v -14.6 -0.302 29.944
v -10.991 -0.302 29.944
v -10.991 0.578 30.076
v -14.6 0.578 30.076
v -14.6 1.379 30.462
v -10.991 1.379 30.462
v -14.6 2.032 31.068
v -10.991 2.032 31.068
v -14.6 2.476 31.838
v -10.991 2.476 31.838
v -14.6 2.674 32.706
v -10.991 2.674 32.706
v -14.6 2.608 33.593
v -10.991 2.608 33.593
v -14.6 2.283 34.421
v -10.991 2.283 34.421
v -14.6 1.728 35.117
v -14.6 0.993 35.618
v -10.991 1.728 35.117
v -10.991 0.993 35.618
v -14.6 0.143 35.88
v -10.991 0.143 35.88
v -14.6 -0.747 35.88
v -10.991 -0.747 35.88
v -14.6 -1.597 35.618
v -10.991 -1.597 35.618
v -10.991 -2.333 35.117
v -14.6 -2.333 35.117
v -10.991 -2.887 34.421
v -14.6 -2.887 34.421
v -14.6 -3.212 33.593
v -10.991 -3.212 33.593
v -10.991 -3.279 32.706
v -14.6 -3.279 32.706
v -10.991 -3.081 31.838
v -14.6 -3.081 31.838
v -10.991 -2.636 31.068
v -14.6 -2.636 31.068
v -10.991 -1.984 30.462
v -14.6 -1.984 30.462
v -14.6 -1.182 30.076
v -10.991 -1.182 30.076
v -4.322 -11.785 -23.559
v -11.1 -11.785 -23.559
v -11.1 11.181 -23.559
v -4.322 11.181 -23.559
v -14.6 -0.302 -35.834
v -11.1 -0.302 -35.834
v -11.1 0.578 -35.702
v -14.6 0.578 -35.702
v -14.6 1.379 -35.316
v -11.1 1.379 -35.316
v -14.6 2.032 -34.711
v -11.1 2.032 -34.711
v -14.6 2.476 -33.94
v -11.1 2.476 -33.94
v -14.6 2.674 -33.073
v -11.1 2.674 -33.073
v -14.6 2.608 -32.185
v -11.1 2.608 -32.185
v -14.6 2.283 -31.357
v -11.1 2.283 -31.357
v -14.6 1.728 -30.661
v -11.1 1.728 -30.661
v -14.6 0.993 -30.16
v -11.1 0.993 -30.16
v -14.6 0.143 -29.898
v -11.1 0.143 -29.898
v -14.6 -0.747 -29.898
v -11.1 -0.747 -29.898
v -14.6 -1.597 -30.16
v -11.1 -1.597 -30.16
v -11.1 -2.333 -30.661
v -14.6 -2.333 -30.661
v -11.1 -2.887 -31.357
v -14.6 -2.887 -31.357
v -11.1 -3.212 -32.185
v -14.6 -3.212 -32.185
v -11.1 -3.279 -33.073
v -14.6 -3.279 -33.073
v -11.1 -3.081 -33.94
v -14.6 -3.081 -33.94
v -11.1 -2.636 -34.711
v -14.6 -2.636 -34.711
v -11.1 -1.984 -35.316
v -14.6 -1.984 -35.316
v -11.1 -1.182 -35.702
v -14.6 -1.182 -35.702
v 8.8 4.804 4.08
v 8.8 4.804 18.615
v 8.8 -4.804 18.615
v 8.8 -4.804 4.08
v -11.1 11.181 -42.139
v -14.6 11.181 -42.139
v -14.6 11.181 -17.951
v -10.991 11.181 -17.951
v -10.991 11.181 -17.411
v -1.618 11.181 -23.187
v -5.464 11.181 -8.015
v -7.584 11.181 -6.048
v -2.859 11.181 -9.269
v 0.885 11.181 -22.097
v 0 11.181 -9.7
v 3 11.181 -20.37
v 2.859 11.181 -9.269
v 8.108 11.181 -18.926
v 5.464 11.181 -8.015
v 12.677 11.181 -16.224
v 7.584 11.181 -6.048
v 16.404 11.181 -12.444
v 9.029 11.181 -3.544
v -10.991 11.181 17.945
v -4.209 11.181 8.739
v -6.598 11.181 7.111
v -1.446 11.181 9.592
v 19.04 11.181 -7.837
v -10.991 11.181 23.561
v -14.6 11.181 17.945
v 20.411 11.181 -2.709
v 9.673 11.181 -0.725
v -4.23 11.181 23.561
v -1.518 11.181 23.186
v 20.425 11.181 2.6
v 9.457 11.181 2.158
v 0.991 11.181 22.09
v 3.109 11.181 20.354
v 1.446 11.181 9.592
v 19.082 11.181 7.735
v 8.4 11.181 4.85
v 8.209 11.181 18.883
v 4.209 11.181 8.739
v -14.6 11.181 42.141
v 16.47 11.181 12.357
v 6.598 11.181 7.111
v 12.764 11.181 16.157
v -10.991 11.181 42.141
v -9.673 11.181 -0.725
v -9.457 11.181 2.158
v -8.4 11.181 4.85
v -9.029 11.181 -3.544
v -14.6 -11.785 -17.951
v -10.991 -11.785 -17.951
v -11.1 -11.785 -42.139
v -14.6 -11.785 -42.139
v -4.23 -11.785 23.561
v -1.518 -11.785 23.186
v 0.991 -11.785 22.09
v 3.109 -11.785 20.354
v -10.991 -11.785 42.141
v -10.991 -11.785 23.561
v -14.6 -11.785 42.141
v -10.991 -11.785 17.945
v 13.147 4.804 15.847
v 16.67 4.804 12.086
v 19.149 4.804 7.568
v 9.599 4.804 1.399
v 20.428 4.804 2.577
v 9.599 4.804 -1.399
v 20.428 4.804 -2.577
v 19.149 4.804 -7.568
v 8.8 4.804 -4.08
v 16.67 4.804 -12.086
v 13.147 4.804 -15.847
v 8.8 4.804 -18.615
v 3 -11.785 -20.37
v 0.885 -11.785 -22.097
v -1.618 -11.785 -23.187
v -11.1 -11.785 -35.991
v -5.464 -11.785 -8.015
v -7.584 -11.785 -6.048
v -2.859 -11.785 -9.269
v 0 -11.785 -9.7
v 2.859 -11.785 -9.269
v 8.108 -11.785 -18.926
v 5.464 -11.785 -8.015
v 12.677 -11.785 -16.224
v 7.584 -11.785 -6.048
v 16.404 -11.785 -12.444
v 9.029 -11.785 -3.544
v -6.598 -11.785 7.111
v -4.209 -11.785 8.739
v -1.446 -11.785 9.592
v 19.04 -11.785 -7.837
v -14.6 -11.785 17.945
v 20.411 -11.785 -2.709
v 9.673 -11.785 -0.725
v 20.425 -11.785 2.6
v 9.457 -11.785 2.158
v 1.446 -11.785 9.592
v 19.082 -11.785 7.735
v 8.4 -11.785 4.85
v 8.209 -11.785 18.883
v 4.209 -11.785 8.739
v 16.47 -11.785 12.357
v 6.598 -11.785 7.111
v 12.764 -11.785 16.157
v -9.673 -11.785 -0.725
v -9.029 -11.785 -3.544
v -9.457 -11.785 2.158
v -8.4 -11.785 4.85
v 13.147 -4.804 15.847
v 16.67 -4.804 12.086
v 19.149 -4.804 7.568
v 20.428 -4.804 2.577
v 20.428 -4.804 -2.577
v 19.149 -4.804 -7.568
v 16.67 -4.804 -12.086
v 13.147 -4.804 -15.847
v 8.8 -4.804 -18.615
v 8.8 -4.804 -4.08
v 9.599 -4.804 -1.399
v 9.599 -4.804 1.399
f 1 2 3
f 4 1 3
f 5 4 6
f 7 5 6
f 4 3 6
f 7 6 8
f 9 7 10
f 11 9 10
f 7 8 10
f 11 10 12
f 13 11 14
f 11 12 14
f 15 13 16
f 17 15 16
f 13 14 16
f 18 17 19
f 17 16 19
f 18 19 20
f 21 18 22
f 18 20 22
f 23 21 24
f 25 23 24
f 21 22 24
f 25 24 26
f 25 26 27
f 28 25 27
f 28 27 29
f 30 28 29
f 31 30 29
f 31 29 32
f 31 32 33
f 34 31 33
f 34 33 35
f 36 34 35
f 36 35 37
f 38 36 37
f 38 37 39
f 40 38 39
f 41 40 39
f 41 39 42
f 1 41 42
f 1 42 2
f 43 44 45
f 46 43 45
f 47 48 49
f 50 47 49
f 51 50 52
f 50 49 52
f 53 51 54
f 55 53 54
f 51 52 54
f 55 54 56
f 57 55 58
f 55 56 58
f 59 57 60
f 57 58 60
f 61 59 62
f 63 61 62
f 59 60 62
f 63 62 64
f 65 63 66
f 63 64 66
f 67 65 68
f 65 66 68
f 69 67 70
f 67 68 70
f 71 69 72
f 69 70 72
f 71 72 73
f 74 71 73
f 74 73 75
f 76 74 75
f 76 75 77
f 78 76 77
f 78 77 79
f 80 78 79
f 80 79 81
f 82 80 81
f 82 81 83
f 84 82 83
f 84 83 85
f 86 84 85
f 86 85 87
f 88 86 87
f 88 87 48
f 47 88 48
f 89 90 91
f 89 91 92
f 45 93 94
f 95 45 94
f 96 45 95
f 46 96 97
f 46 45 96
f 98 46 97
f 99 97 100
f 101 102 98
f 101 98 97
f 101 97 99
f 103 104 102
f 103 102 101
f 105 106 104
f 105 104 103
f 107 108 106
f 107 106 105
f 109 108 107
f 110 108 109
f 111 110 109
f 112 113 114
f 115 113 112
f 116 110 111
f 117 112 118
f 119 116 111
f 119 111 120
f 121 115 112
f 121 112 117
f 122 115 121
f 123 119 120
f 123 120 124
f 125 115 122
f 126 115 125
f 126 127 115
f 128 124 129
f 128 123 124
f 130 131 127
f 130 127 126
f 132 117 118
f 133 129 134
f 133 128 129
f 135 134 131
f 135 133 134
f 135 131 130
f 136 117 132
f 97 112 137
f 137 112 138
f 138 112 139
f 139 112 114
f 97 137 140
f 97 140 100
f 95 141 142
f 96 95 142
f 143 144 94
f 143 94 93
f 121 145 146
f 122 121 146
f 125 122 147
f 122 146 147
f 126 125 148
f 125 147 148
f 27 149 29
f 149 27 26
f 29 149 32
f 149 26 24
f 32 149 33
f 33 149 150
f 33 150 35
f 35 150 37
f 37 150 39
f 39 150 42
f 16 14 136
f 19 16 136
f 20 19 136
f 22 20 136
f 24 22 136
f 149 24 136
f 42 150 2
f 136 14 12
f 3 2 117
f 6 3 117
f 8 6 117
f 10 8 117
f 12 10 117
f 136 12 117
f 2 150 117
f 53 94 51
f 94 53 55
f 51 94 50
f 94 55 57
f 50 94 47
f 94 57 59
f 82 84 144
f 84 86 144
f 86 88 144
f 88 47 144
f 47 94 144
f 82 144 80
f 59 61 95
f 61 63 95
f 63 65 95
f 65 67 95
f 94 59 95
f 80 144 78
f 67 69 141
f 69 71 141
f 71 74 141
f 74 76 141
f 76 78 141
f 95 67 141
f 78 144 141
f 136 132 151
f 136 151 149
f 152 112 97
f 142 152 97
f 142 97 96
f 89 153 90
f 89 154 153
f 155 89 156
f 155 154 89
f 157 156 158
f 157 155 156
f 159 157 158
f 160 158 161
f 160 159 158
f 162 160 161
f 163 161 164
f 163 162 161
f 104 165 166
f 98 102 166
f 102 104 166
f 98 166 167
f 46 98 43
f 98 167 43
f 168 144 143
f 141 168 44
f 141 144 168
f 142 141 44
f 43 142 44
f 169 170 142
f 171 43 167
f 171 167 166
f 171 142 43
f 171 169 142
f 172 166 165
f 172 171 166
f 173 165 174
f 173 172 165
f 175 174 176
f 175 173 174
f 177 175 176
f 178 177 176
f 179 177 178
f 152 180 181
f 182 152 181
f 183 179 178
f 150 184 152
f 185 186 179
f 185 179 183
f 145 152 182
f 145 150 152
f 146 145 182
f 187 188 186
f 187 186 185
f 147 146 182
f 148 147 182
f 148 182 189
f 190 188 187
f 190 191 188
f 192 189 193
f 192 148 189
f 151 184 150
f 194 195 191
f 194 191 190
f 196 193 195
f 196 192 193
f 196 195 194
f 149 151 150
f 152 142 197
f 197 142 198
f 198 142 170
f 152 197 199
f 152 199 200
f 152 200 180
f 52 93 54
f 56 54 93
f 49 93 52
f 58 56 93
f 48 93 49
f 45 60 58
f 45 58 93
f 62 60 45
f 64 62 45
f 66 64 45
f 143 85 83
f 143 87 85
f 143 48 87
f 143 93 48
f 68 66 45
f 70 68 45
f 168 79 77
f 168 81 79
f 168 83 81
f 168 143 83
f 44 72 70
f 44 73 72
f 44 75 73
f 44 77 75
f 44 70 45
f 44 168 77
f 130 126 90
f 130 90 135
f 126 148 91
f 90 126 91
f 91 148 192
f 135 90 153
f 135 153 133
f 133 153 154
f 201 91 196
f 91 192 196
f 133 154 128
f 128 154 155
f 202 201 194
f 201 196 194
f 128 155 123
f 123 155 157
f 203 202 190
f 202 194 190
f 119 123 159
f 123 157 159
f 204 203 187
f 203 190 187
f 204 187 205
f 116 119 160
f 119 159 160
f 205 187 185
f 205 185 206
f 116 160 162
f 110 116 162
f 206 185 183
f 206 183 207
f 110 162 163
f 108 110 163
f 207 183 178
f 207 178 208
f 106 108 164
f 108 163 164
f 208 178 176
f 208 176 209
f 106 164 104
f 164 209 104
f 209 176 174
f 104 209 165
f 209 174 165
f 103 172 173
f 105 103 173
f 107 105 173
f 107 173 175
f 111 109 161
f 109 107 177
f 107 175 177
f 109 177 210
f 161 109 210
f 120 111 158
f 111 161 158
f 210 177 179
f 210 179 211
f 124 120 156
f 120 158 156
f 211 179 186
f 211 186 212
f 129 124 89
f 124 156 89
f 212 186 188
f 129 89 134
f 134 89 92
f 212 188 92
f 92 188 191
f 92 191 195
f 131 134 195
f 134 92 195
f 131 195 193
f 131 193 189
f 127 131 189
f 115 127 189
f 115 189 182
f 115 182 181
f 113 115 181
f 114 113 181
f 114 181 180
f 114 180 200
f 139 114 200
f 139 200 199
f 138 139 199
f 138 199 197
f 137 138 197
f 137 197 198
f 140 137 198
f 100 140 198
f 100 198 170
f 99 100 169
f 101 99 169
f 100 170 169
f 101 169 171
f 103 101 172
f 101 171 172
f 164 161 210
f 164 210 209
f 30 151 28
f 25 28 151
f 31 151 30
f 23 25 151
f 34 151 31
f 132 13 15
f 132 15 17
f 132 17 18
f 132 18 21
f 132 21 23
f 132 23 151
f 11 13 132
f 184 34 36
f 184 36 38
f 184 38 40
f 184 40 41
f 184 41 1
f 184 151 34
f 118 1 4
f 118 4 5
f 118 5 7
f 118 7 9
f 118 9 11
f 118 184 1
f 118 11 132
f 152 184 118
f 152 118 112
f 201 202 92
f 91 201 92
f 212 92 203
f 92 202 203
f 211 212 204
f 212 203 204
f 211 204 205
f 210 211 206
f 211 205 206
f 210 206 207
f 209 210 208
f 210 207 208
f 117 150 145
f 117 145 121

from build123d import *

# Parameters (mm, degrees)
SKETCH_1_R           = 20.68
SKETCH_1_R_2         = 9.68
EXTRUDE_1_DEPTH      = 116.68
SKETCH_11_W          = 27
SKETCH_11_H          = 150
CUT_EXTRUDE_3_DEPTH  = 40
SKETCH_13_W          = 10
SKETCH_13_H          = 128.345013401
CUT_EXTRUDE_7_DEPTH  = 126.614916312
SKETCH_15_W          = 8
SKETCH_15_H          = 68.68
CUT_EXTRUDE_9_DEPTH  = 48
SKETCH_16_W          = 15.549431524
SKETCH_16_H          = 20
SKETCH_16_W_2        = 15.459431524
EXTRUDE_4_DEPTH      = 19.2
SKETCH_17_W          = 19.20851187
SKETCH_17_H          = 14.03
CUT_EXTRUDE_10_DEPTH = 20.2
SKETCH_18_R          = 9.59
CUT_EXTRUDE_11_DEPTH = 121.289430957
SKETCH_21_R          = 2.985
CUT_EXTRUDE_12_DEPTH = 55.2
EXTRUDE_START        = 55.2
SKETCH_24_R          = 20.59
SKETCH_24_R_2        = 9.59
EXTRUDE_2_DEPTH      = 55.2
CUT_EXTRUDE_13_DEPTH = 55.2
SKETCH_26_W          = 10.00851187
SKETCH_26_H          = 41.68
CUT_EXTRUDE_15_DEPTH = 55.2
SKETCH_27_W          = 10
SKETCH_27_H          = 40
CUT_EXTRUDE_16_DEPTH = 55.2
SKETCH_28_W          = 44.880694938
SKETCH_28_H          = 9.608044066
CUT_EXTRUDE_17_DEPTH = 12.2
SKETCH_35_W          = 13.53
SKETCH_35_H          = 20
EXTRUDE_10_DEPTH     = 15
EXTRUDE_11_DEPTH     = 15
SKETCH_37_W          = 9
SKETCH_37_H          = 20
EXTRUDE_12_DEPTH     = 20
SKETCH_38_W          = 9
SKETCH_38_H          = 20
EXTRUDE_13_DEPTH     = 20
SKETCH_42_R          = 2.985
CUT_EXTRUDE_21_DEPTH = 20
CUT_EXTRUDE_23_DEPTH = 138.235841092
SKETCH_45_W          = 3
SKETCH_45_H          = 20
EXTRUDE_14_DEPTH     = 30
SKETCH_46_W          = 3
SKETCH_46_H          = 20
EXTRUDE_15_DEPTH     = 30
SKETCH_47_W          = 33.078221107
SKETCH_47_H          = 20
EXTRUDE_16_DEPTH     = 50
SKETCH_48_W          = 30
SKETCH_48_H          = 20
EXTRUDE_17_DEPTH     = 50
SKETCH_50_W          = 50
SKETCH_50_H          = 20
EXTRUDE_18_DEPTH     = 1
SKETCH_51_W          = 50
SKETCH_51_H          = 20
EXTRUDE_19_DEPTH     = 1
SKETCH_52_W          = 53
SKETCH_52_H          = 14
CUT_EXTRUDE_24_DEPTH = 151.972575738
SKETCH_53_W          = 53
SKETCH_53_H          = 14
CUT_EXTRUDE_25_DEPTH = 151.942387436
SKETCH_54_W          = 40
SKETCH_54_H          = 73.27
CUT_EXTRUDE_26_DEPTH = 147.866192927
SKETCH_56_W          = 13.00851187
SKETCH_56_H          = 20
EXTRUDE_21_DEPTH     = 3.08
SKETCH_60_W          = 6.504255935
SKETCH_60_H          = 76.35
CUT_EXTRUDE_30_DEPTH = 137.106994034
CUT_EXTRUDE_32_DEPTH = 20
SKETCH_64_W          = 16.20851187
SKETCH_64_H          = 0.09
EXTRUDE_22_DEPTH     = 20
SKETCH_65_W          = 3.495744065
SKETCH_65_H          = 3.26
CUT_EXTRUDE_33_DEPTH = 137.057988464
SKETCH_66_W          = 3.495744065
SKETCH_66_H          = 1.776778893
SKETCH_66_W_2        = 3.503635083
SKETCH_66_H_2        = 1.775
EXTRUDE_23_DEPTH     = 20.2
SKETCH_68_W          = 6.504255935
SKETCH_68_H          = 3.66
CUT_EXTRUDE_34_DEPTH = 20
SKETCH_69_R          = 2.985
CUT_EXTRUDE_35_DEPTH = 126.598983893
SKETCH_70_R          = 2.985
CUT_EXTRUDE_36_DEPTH = 132.360728238
SKETCH_71_W          = 38.005321573
SKETCH_71_H          = 111.965885132
CUT_EXTRUDE_37_DEPTH = 147.475577566
SKETCH_72_R          = 9.7
CUT_EXTRUDE_38_DEPTH = 38.185254838
CUT_EXTRUDE_START    = -22
SKETCH_77_R          = 30.59
SKETCH_77_R_2        = 20.59
CUT_EXTRUDE_2_DEPTH  = 22
SKETCH_78_W          = 34.816185151
SKETCH_78_H          = 22.96559116
EXTRUDE_26_DEPTH     = 0.1
SKETCH_80_W          = 2.900031179
SKETCH_80_H          = 6.148706656
EXTRUDE_28_DEPTH     = 23.1
SKETCH_81_W          = 6.148706656
SKETCH_81_H          = 23.1
EXTRUDE_29_DEPTH     = 14.1
SKETCH_82_W          = 6.148706656
SKETCH_82_H          = 0.13440884
CUT_EXTRUDE_39_DEPTH = 19.1
SKETCH_83_W          = 2.900031179
SKETCH_83_H          = 22.96559116
EXTRUDE_30_DEPTH     = 19.1
FILLET_1_R           = 10
SKETCH_84_W          = 3.5
SKETCH_84_H          = 19.1
EXTRUDE_31_DEPTH     = 23.1
SKETCH_85_W          = 3.5
SKETCH_85_H          = 0.52
CUT_EXTRUDE_40_DEPTH = 48.860163141
SKETCH_86_W          = 3.5
SKETCH_86_H          = 22.96559116
EXTRUDE_32_DEPTH     = 62.1
SKETCH_87_W          = 3.60851187
SKETCH_87_H          = 34.816185151
CUT_EXTRUDE_41_DEPTH = 62.1
SKETCH_89_W          = 0.10851187
SKETCH_89_H          = 6.15
EXTRUDE_33_DEPTH     = 23.1
EXTRUDE_34_DEPTH     = 22.1
SKETCH_91_W          = 0.971561636
SKETCH_91_H          = 22.96559116
CUT_EXTRUDE_42_DEPTH = 22.1
SKETCH_95_W          = 6.15
SKETCH_95_H          = 22.96559116
EXTRUDE_35_DEPTH     = 14.1
FILLET_2_R           = 10
SKETCH_96_W          = 3.60851187
SKETCH_96_H          = 2.548438364
CUT_EXTRUDE_43_DEPTH = 55.35700885
SKETCH_97_W          = 3.5
SKETCH_97_H          = 6.148706656
EXTRUDE_36_DEPTH     = 23.1
CUT_EXTRUDE_44_DEPTH = 23.1
SKETCH_99_W          = 6.15
SKETCH_99_H          = 0.13440884
CUT_EXTRUDE_45_DEPTH = 23.1
SKETCH_101_R         = 2.985
CUT_EXTRUDE_46_DEPTH = 23.1
SKETCH_103_W         = 3.60851187
SKETCH_103_H         = 0.54
CUT_EXTRUDE_49_DEPTH = 53.222714265
SKETCH_104_W         = 3.60851187
SKETCH_104_H         = 0.54
CUT_EXTRUDE_50_DEPTH = 53.222714265


with BuildPart() as part:
    # 草圖1 → 伸長-薄件1 (new body)
    with BuildSketch(Plane(origin=(0, 0, 0), x_dir=(1, 0, 0), z_dir=(0, 1, 0))):
        Circle(SKETCH_1_R)
        Circle(SKETCH_1_R_2, mode=Mode.SUBTRACT)
    extrude(amount=EXTRUDE_1_DEPTH)

    # 草圖11 → 除料-伸長3 (cut)
    with BuildSketch(Plane(origin=(0, 116.68, 0), x_dir=(1, 0, 0), z_dir=(0, 1, 0))):
        with Locations((21.70851187, -44.235815192)):
            Rectangle(SKETCH_11_W, SKETCH_11_H)
    extrude(amount=-CUT_EXTRUDE_3_DEPTH, mode=Mode.SUBTRACT)

    # 草圖13 → 除料-伸長7 (cut, through all)
    with BuildSketch(Plane.XY.offset(21)):
        with Locations((-16, 58.612182466)):
            Rectangle(SKETCH_13_W, SKETCH_13_H)
    extrude(amount=-CUT_EXTRUDE_7_DEPTH, mode=Mode.SUBTRACT)

    # 草圖15 → 除料-伸長9 (cut)
    with BuildSketch(Plane.XY.offset(21)):
        with Locations((-1.395744065, 52.34)):
            Rectangle(SKETCH_15_W, SKETCH_15_H)
    extrude(amount=-CUT_EXTRUDE_9_DEPTH, mode=Mode.SUBTRACT)

    # 草圖16 → 填料-伸長4 (add)
    with BuildSketch(Plane(origin=(8.20851187, 0, 0), x_dir=(0, 0, -1), z_dir=(1, 0, 0))):
        with Locations((12.905284238, 106.68)):
            Rectangle(SKETCH_16_W, SKETCH_16_H)
        with Locations((-12.860284238, 106.68)):
            Rectangle(SKETCH_16_W_2, SKETCH_16_H)
    extrude(amount=-EXTRUDE_4_DEPTH)

    # 草圖17 → 除料-伸長10 (cut)
    with BuildSketch(Plane(origin=(0, 116.68, 0), x_dir=(1, 0, 0), z_dir=(0, 1, 0))):
        with Locations((-1.395744065, -0.045)):
            Rectangle(SKETCH_17_W, SKETCH_17_H)
    extrude(amount=-CUT_EXTRUDE_10_DEPTH, mode=Mode.SUBTRACT)

    # 草圖18 → 除料-伸長11 (cut, through all)
    with BuildSketch(Plane.XZ):
        with Locations(Location((0, 0, 0), (0, 0, 90))):
            Circle(SKETCH_18_R)
    extrude(amount=-CUT_EXTRUDE_11_DEPTH, mode=Mode.SUBTRACT)

    # 草圖21 → 除料-伸長12 (cut)
    with BuildSketch(Plane(origin=(0, 0, -20.68), x_dir=(-1, 0, 0), z_dir=(0, 0, -1))):
        with Locations((1.39148813, 108.73)):
            Circle(SKETCH_21_R)
    extrude(amount=-CUT_EXTRUDE_12_DEPTH, mode=Mode.SUBTRACT)

    # 草圖24 → 伸長-薄件2 (add)
    with BuildSketch(Plane.XZ.offset(EXTRUDE_START)):
        Circle(SKETCH_24_R)
        Circle(SKETCH_24_R_2, mode=Mode.SUBTRACT)
    extrude(amount=-EXTRUDE_2_DEPTH)

    # 草圖25 → 除料-伸長13 (cut)
    with BuildSketch(Plane.XY.offset(21)):
        Polygon((-1.39148813, -11.785), (22.612379708, -11.785), (22.612379708, -63.873337429), (-22.749525245, -63.873337429), (-22.749525245, -11.785), align=None)
    extrude(amount=-CUT_EXTRUDE_13_DEPTH, mode=Mode.SUBTRACT)

    # 草圖26 → 除料-伸長15 (cut)
    with BuildSketch(Plane(origin=(0, 0, 0), x_dir=(1, 0, 0), z_dir=(0, 1, 0))):
        with Locations((-15.995744065, -0.16)):
            Rectangle(SKETCH_26_W, SKETCH_26_H)
    extrude(amount=-CUT_EXTRUDE_15_DEPTH, mode=Mode.SUBTRACT)

    # 草圖27 → 除料-伸長16 (cut)
    with BuildSketch(Plane(origin=(21, 0, 0), x_dir=(0, 0, -1), z_dir=(1, 0, 0))):
        with Locations((0, 41.68)):
            Rectangle(SKETCH_27_W, SKETCH_27_H)
    extrude(amount=-CUT_EXTRUDE_16_DEPTH, mode=Mode.SUBTRACT)

    # 草圖28 → 除料-伸長17 (cut)
    with BuildSketch(Plane(origin=(21, 0, 0), x_dir=(0, 0, -1), z_dir=(1, 0, 0))):
        Rectangle(SKETCH_28_W, SKETCH_28_H)
    extrude(amount=-CUT_EXTRUDE_17_DEPTH, mode=Mode.SUBTRACT)

    # 草圖35 → 填料-伸長10 (add)
    with BuildSketch(Plane.ZY.offset(10.99148813)):
        with Locations((13.825, 106.68)):
            Rectangle(SKETCH_35_W, SKETCH_35_H)
    extrude(amount=EXTRUDE_10_DEPTH)

    # 草圖36 → 填料-伸長11 (add)
    with BuildSketch(Plane.ZY.offset(10.99148813)):
        Polygon((-20.68, 116.68), (-6.97, 116.68), (-6.97, 96.48), (-20.68, 96.68), align=None)
    extrude(amount=EXTRUDE_11_DEPTH)

    # 草圖37 → 填料-伸長12 (add)
    with BuildSketch(Plane.XY.offset(20.59)):
        with Locations((-21.49148813, 106.68)):
            Rectangle(SKETCH_37_W, SKETCH_37_H)
    extrude(amount=EXTRUDE_12_DEPTH)

    # 草圖38 → 填料-伸長13 (add)
    with BuildSketch(Plane(origin=(0, 0, -20.68), x_dir=(-1, 0, 0), z_dir=(0, 0, -1))):
        with Locations((21.49148813, 106.68)):
            Rectangle(SKETCH_38_W, SKETCH_38_H)
    extrude(amount=EXTRUDE_13_DEPTH)

    # 草圖42 → 除料-伸長21 (cut)
    with BuildSketch(Plane(origin=(-16.99148813, 0, 0), x_dir=(0, 0, -1), z_dir=(1, 0, 0))):
        with Locations((30.68, 106.554418142)):
            Circle(SKETCH_42_R)
        with Locations((-30.395640125, 106.68)):
            Circle(SKETCH_42_R)
    extrude(amount=-CUT_EXTRUDE_21_DEPTH, mode=Mode.SUBTRACT)

    # 草圖43 → 除料-伸長23 (cut, through all)
    with BuildSketch(Plane(origin=(0, 116.68, 0), x_dir=(1, 0, 0), z_dir=(0, 1, 0))):
        Polygon((-11, 6.97), (-10.99148813, 20.68), (-10.99148813, 48.096794253), (-28.274756234, 48.096794253), (-28.274756234, -43.270506289), (-11, -43.270506289), align=None)
    extrude(amount=-CUT_EXTRUDE_23_DEPTH, mode=Mode.SUBTRACT)

    # 草圖45 → 填料-伸長14 (add)
    with BuildSketch(Plane.XY.offset(20.59)):
        with Locations((-9.5, 106.68)):
            Rectangle(SKETCH_45_W, SKETCH_45_H)
    extrude(amount=EXTRUDE_14_DEPTH)

    # 草圖46 → 填料-伸長15 (add)
    with BuildSketch(Plane(origin=(0, 0, -20.68), x_dir=(-1, 0, 0), z_dir=(0, 0, -1))):
        with Locations((9.49148813, 106.68)):
            Rectangle(SKETCH_46_W, SKETCH_46_H)
    extrude(amount=EXTRUDE_15_DEPTH)

    # 草圖47 → 填料-伸長16 (add)
    with BuildSketch(Plane.ZY.offset(11)):
        with Locations((34.050889447, 106.68)):
            Rectangle(SKETCH_47_W, SKETCH_47_H)
    extrude(amount=EXTRUDE_16_DEPTH)

    # 草圖48 → 填料-伸長17 (add)
    with BuildSketch(Plane.ZY.offset(10.99148813)):
        with Locations((-35.68, 106.68)):
            Rectangle(SKETCH_48_W, SKETCH_48_H)
    extrude(amount=EXTRUDE_17_DEPTH)

    # 草圖50 → 填料-伸長18 (add)
    with BuildSketch(Plane(origin=(0, 0, 17.511778893), x_dir=(-1, 0, 0), z_dir=(0, 0, -1))):
        with Locations((36, 106.68)):
            Rectangle(SKETCH_50_W, SKETCH_50_H)
    extrude(amount=EXTRUDE_18_DEPTH)

    # 草圖51 → 填料-伸長19 (add)
    with BuildSketch(Plane.XY.offset(-20.68)):
        with Locations((-35.99148813, 106.68)):
            Rectangle(SKETCH_51_W, SKETCH_51_H)
    extrude(amount=EXTRUDE_19_DEPTH)

    # 草圖52 → 除料-伸長24 (cut, through all)
    with BuildSketch(Plane(origin=(0, 116.68, 0), x_dir=(1, 0, 0), z_dir=(0, 1, 0))):
        with Locations((-34.49148813, 43.68)):
            Rectangle(SKETCH_52_W, SKETCH_52_H)
    extrude(amount=-CUT_EXTRUDE_24_DEPTH, mode=Mode.SUBTRACT)

    # 草圖53 → 除料-伸長25 (cut, through all)
    with BuildSketch(Plane(origin=(0, 116.68, 0), x_dir=(1, 0, 0), z_dir=(0, 1, 0))):
        with Locations((-34.5, -43.59)):
            Rectangle(SKETCH_53_W, SKETCH_53_H)
    extrude(amount=-CUT_EXTRUDE_25_DEPTH, mode=Mode.SUBTRACT)

    # 草圖54 → 除料-伸長26 (cut, through all)
    with BuildSketch(Plane(origin=(0, 116.68, 0), x_dir=(1, 0, 0), z_dir=(0, 1, 0))):
        with Locations((-41, 0.045)):
            Rectangle(SKETCH_54_W, SKETCH_54_H)
    extrude(amount=-CUT_EXTRUDE_26_DEPTH, mode=Mode.SUBTRACT)

    # 草圖56 → 填料-伸長21 (add)
    with BuildSketch(Plane(origin=(0, 0, -36.68), x_dir=(-1, 0, 0), z_dir=(0, 0, -1))):
        with Locations((14.495744065, 106.68)):
            Rectangle(SKETCH_56_W, SKETCH_56_H)
    extrude(amount=EXTRUDE_21_DEPTH)

    # 草圖60 → 除料-伸長30 (cut, through all)
    with BuildSketch(Plane(origin=(0, 116.68, 0), x_dir=(1, 0, 0), z_dir=(0, 1, 0))):
        with Locations((-17.747872032, 1.585)):
            Rectangle(SKETCH_60_W, SKETCH_60_H)
    extrude(amount=-CUT_EXTRUDE_30_DEPTH, mode=Mode.SUBTRACT)

    # 草圖61 → 除料-伸長32 (cut)
    with BuildSketch(Plane(origin=(0, 116.68, 0), x_dir=(1, 0, 0), z_dir=(0, 1, 0))):
        Polygon((1.92725193, -20.59), (1.92725193, -22.399121663), (-2.174190472, -21.421542421), (-2.174190472, -20.59), align=None)
    extrude(amount=-CUT_EXTRUDE_32_DEPTH, mode=Mode.SUBTRACT)

    # 草圖64 → 填料-伸長22 (add)
    with BuildSketch(Plane(origin=(0, 116.68, 0), x_dir=(1, 0, 0), z_dir=(0, 1, 0))):
        with Locations((0.104255935, -20.635)):
            Rectangle(SKETCH_64_W, SKETCH_64_H)
    extrude(amount=-EXTRUDE_22_DEPTH)

    # 草圖65 → 除料-伸長33 (cut, through all)
    with BuildSketch(Plane(origin=(0, 116.68, 0), x_dir=(1, 0, 0), z_dir=(0, 1, 0))):
        with Locations((-12.747872033, -18.141778893)):
            Rectangle(SKETCH_65_W, SKETCH_65_H)
    extrude(amount=-CUT_EXTRUDE_33_DEPTH, mode=Mode.SUBTRACT)

    # 草圖66 → 填料-伸長23 (add)
    with BuildSketch(Plane(origin=(0, 96.48, 0), x_dir=(1, 0, 0), z_dir=(0, 1, 0))):
        with Locations((-12.747872033, -18.883389447)):
            Rectangle(SKETCH_66_W, SKETCH_66_H)
        with Locations((-12.743926524, 18.7925)):
            Rectangle(SKETCH_66_W_2, SKETCH_66_H_2)
    extrude(amount=EXTRUDE_23_DEPTH)

    # 草圖68 → 除料-伸長34 (cut)
    with BuildSketch(Plane(origin=(0, 116.68, 0), x_dir=(1, 0, 0), z_dir=(0, 1, 0))):
        with Locations((-11.243616098, 37.93)):
            Rectangle(SKETCH_68_W, SKETCH_68_H)
    extrude(amount=-CUT_EXTRUDE_34_DEPTH, mode=Mode.SUBTRACT)

    # 草圖69 → 除料-伸長35 (cut, through all)
    with BuildSketch(Plane(origin=(-7.99148813, 0, 0), x_dir=(0, 0, -1), z_dir=(1, 0, 0))):
        with Locations((28.39, 106.68)):
            Circle(SKETCH_69_R)
        with Locations((-28.635, 106.68)):
            Circle(SKETCH_69_R)
    extrude(amount=-CUT_EXTRUDE_35_DEPTH, mode=Mode.SUBTRACT)

    # 草圖70 → 除料-伸長36 (cut, through all)
    with BuildSketch(Plane(origin=(0, 0, 20.59), x_dir=(-1, 0, 0), z_dir=(0, 0, -1))):
        with Locations((1.39148813, 108.73)):
            Circle(SKETCH_70_R)
    extrude(amount=-CUT_EXTRUDE_36_DEPTH, mode=Mode.SUBTRACT)

    # 草圖71 → 除料-伸長37 (cut, through all)
    with BuildSketch(Plane.XY.offset(50)):
        with Locations((2.76131712, 67.163533726)):
            Rectangle(SKETCH_71_W, SKETCH_71_H)
    extrude(amount=-CUT_EXTRUDE_37_DEPTH, mode=Mode.SUBTRACT)

    # 草圖72 → 除料-伸長38 (cut, through all)
    with BuildSketch(Plane.XZ.offset(11.785)):
        with Locations(Location((0, 0, 0), (0, 0, 270))):
            Circle(SKETCH_72_R)
    extrude(amount=-CUT_EXTRUDE_38_DEPTH, mode=Mode.SUBTRACT)

    # 草圖77 → 除料-伸長-薄件2 (cut)
    with BuildSketch(Plane(origin=(0, 11.18059116, 0), x_dir=(1, 0, 0), z_dir=(0, 1, 0)).offset(CUT_EXTRUDE_START)):
        Circle(SKETCH_77_R)
        Circle(SKETCH_77_R_2, mode=Mode.SUBTRACT)
    extrude(amount=CUT_EXTRUDE_2_DEPTH, mode=Mode.SUBTRACT)

    # 草圖78 → 填料-伸長26 (add)
    with BuildSketch(Plane.ZY.offset(11)):
        with Locations((-0.002688243, -0.30220442)):
            Rectangle(SKETCH_78_W, SKETCH_78_H)
    extrude(amount=EXTRUDE_26_DEPTH)



with BuildPart() as body_2:
    # 草圖80 → 填料-伸長28 (new body)
    with BuildSketch(Plane.XZ.offset(11.785)):
        with Locations((-12.55001559, -20.485134146)):
            Rectangle(SKETCH_80_W, SKETCH_80_H)
    extrude(amount=-EXTRUDE_28_DEPTH)


with BuildPart() as part_1:
    add(part.part)

    add(body_2.part)  # 填料-伸長29 merges body 2
    # 草圖81 → 填料-伸長29 (add)
    with BuildSketch(Plane(origin=(-11.1, 0, 0), x_dir=(0, 0, -1), z_dir=(1, 0, 0))):
        with Locations((20.485134146, -0.235)):
            Rectangle(SKETCH_81_W, SKETCH_81_H)
    extrude(amount=EXTRUDE_29_DEPTH)

    # 草圖82 → 除料-伸長39 (cut)
    with BuildSketch(Plane(origin=(3, 0, 0), x_dir=(0, 0, -1), z_dir=(1, 0, 0))):
        with Locations((20.485134146, 11.24779558)):
            Rectangle(SKETCH_82_W, SKETCH_82_H)
    extrude(amount=-CUT_EXTRUDE_39_DEPTH, mode=Mode.SUBTRACT)

    # 草圖83 → 填料-伸長30 (add)
    with BuildSketch(Plane.XY.offset(-17.410780818)):
        with Locations((-12.55001559, -0.30220442)):
            Rectangle(SKETCH_83_W, SKETCH_83_H)
    extrude(amount=-EXTRUDE_30_DEPTH)

    # 圓角1
    # the kernel refuses this fillet: 10 mm, written as the material it takes off along each edge
    with BuildSketch(Plane(origin=(3, -30.090254449, -23.559487474), x_dir=(-1, 0, 0), z_dir=(0, 1, 0))) as fillet_1_piece_1:
        with BuildLine():
            CenterArc((7.32210178, 10), FILLET_1_R, 222.927997508, 47.072002492)
            Line((0, 3.189212562), (-0.146442036, 3.052996813))
            ThreePointArc((-0.146442036, 3.052996813), (-0.2, 1.594606281), (-0.2, 0))
            Line((-0.2, 0), (0, -0.2))
            Line((0, -0.2), (7.32210178, -0.2))
            Line((7.32210178, -0.2), (7.32210178, 0))
        make_face()
    extrude(amount=59.576100059, mode=Mode.SUBTRACT)

    # 草圖84 → 填料-伸長31 (add)
    with BuildSketch(Plane(origin=(0, -11.785, 0), x_dir=(-1, 0, 0), z_dir=(0, -1, 0))):
        with Locations((12.85, 26.960780818)):
            Rectangle(SKETCH_84_W, SKETCH_84_H)
    extrude(amount=-EXTRUDE_31_DEPTH)

    # 草圖85 → 除料-伸長40 (cut, through all)
    with BuildSketch(Plane.XZ.offset(11.785)):
        with Locations((-12.85, -36.250780818)):
            Rectangle(SKETCH_85_W, SKETCH_85_H)
    extrude(amount=-CUT_EXTRUDE_40_DEPTH, mode=Mode.SUBTRACT)

    # 草圖86 → 填料-伸長32 (add)
    with BuildSketch(Plane.XY.offset(-17.410780818)):
        with Locations((-12.85, -0.30220442)):
            Rectangle(SKETCH_86_W, SKETCH_86_H)
    extrude(amount=EXTRUDE_32_DEPTH)

    # 草圖87 → 除料-伸長41 (cut)
    with BuildSketch(Plane.XZ.offset(11.785)):
        with Locations((-12.795744065, -0.002688243)):
            Rectangle(SKETCH_87_W, SKETCH_87_H)
    extrude(amount=-CUT_EXTRUDE_41_DEPTH, mode=Mode.SUBTRACT)


with BuildPart() as cut_extrude_41_piece_1:
    # of the separate pieces the step leaves, piece 1, a body of its own (cut_extrude_41_pieces)
    add(part_1.part.solids().sort_by_distance((3, 11.18059116, -20.370274912))[0])



with BuildPart() as cut_extrude_41_piece_2:
    # of the separate pieces the step leaves, piece 2, a body of its own (cut_extrude_41_pieces)
    add(part_1.part.solids().sort_by_distance((-11.1, 11.18059116, 17.405404333))[0])

    # 草圖89 → 填料-伸長33 (add)
    with BuildSketch(Plane.XZ.offset(11.785)):
        with Locations((-11.045744065, 20.485780818)):
            Rectangle(SKETCH_89_W, SKETCH_89_H)
    extrude(amount=-EXTRUDE_33_DEPTH)

    # 草圖90 → 填料-伸長34 (add)
    with BuildSketch(Plane.XY.offset(23.560780818)):
        Polygon((-11, 11.18059116), (-11.1, 11.18059116), (-11.1, -11.785), (-10.99148813, -11.785), (-10.99148813, 11.18059116), align=None)
    extrude(amount=EXTRUDE_34_DEPTH)

    # 草圖91 → 除料-伸長42 (cut)
    with BuildSketch(Plane.ZY.offset(11.1)):
        with Locations((45.175, -0.30220442)):
            Rectangle(SKETCH_91_W, SKETCH_91_H)
    extrude(amount=-CUT_EXTRUDE_42_DEPTH, mode=Mode.SUBTRACT)


with BuildPart() as cut_extrude_41_piece_1_1:
    add(cut_extrude_41_piece_1.part)

    add(cut_extrude_41_piece_2.part)  # 填料-伸長35 merges 除料-伸長41 piece 2
    # 草圖95 → 填料-伸長35 (add)
    with BuildSketch(Plane(origin=(-10.99148813, 0, 0), x_dir=(0, 0, -1), z_dir=(1, 0, 0))):
        with Locations((-20.485780818, -0.30220442)):
            Rectangle(SKETCH_95_W, SKETCH_95_H)
    extrude(amount=EXTRUDE_35_DEPTH)

    # 圓角2
    # the kernel refuses this fillet: 10 mm, written as the material it takes off along each edge
    with BuildSketch(Plane(origin=(3.10851187, -30.131013506, 23.560780818), x_dir=(-1, 0, 0), z_dir=(0, 1, 0))) as fillet_2_piece_1:
        with BuildLine():
            CenterArc((7.338405402, -10), FILLET_2_R, 90, 47.209333859)
            Line((0, -3.206782342), (-0.146768108, -3.070917989))
            ThreePointArc((-0.146768108, -3.070917989), (-0.2, -1.603391171), (-0.2, 0))
            Line((-0.2, 0), (0, 0.2))
            Line((0, 0.2), (7.338405402, 0.2))
            Line((7.338405402, 0.2), (7.338405402, 0))
        make_face()
    extrude(amount=59.657618171, mode=Mode.SUBTRACT)

    # 草圖96 → 除料-伸長43 (cut, through all)
    with BuildSketch(Plane.XZ.offset(11.785)):
        with Locations((-12.795744065, 43.415)):
            Rectangle(SKETCH_96_W, SKETCH_96_H)
    extrude(amount=-CUT_EXTRUDE_43_DEPTH, mode=Mode.SUBTRACT)

    # 草圖97 → 填料-伸長36 (add)
    with BuildSketch(Plane.XZ.offset(11.785)):
        with Locations((-12.85, -39.065134146)):
            Rectangle(SKETCH_97_W, SKETCH_97_H)
    extrude(amount=-EXTRUDE_36_DEPTH)

    # 草圖98 → 除料-伸長44 (cut)
    with BuildSketch(Plane(origin=(-11.1, 0, 0), x_dir=(0, 0, -1), z_dir=(1, 0, 0))):
        Polygon((17.410780818, 11.18059116), (17.410780818, 11.315), (22.198280677, 11.315), (38.461669752, 11.315), (42.139487474, 11.315), (42.139487474, 11.18059116), align=None)
    extrude(amount=-CUT_EXTRUDE_44_DEPTH, mode=Mode.SUBTRACT)

    # 草圖99 → 除料-伸長45 (cut)
    with BuildSketch(Plane(origin=(-10.99148813, 0, 0), x_dir=(0, 0, -1), z_dir=(1, 0, 0))):
        with Locations((-20.485780818, 11.24779558)):
            Rectangle(SKETCH_99_W, SKETCH_99_H)
    extrude(amount=-CUT_EXTRUDE_45_DEPTH, mode=Mode.SUBTRACT)

    # 草圖101 → 除料-伸長46 (cut)
    with BuildSketch(Plane(origin=(-10.99148813, 0, 0), x_dir=(0, 0, -1), z_dir=(1, 0, 0))):
        with Locations((-32.928668636, -0.30220442)):
            Circle(SKETCH_101_R)
        with Locations((32.849487474, -0.30220442)):
            Circle(SKETCH_101_R)
    extrude(amount=-CUT_EXTRUDE_46_DEPTH, mode=Mode.SUBTRACT)

    # 草圖103 → 除料-伸長49 (cut, through all)
    with BuildSketch(Plane(origin=(0, 11.18059116, 0), x_dir=(1, 0, 0), z_dir=(0, 1, 0))):
        with Locations((-12.795744065, -17.675404333)):
            Rectangle(SKETCH_103_W, SKETCH_103_H)
    extrude(amount=-CUT_EXTRUDE_49_DEPTH, mode=Mode.SUBTRACT)

    # 草圖104 → 除料-伸長50 (cut, through all)
    with BuildSketch(Plane(origin=(0, 11.18059116, 0), x_dir=(1, 0, 0), z_dir=(0, 1, 0))):
        with Locations((-12.795744065, 17.680780818)):
            Rectangle(SKETCH_104_W, SKETCH_104_H)
    extrude(amount=-CUT_EXTRUDE_50_DEPTH, mode=Mode.SUBTRACT)


solid = cut_extrude_41_piece_1_1.part
